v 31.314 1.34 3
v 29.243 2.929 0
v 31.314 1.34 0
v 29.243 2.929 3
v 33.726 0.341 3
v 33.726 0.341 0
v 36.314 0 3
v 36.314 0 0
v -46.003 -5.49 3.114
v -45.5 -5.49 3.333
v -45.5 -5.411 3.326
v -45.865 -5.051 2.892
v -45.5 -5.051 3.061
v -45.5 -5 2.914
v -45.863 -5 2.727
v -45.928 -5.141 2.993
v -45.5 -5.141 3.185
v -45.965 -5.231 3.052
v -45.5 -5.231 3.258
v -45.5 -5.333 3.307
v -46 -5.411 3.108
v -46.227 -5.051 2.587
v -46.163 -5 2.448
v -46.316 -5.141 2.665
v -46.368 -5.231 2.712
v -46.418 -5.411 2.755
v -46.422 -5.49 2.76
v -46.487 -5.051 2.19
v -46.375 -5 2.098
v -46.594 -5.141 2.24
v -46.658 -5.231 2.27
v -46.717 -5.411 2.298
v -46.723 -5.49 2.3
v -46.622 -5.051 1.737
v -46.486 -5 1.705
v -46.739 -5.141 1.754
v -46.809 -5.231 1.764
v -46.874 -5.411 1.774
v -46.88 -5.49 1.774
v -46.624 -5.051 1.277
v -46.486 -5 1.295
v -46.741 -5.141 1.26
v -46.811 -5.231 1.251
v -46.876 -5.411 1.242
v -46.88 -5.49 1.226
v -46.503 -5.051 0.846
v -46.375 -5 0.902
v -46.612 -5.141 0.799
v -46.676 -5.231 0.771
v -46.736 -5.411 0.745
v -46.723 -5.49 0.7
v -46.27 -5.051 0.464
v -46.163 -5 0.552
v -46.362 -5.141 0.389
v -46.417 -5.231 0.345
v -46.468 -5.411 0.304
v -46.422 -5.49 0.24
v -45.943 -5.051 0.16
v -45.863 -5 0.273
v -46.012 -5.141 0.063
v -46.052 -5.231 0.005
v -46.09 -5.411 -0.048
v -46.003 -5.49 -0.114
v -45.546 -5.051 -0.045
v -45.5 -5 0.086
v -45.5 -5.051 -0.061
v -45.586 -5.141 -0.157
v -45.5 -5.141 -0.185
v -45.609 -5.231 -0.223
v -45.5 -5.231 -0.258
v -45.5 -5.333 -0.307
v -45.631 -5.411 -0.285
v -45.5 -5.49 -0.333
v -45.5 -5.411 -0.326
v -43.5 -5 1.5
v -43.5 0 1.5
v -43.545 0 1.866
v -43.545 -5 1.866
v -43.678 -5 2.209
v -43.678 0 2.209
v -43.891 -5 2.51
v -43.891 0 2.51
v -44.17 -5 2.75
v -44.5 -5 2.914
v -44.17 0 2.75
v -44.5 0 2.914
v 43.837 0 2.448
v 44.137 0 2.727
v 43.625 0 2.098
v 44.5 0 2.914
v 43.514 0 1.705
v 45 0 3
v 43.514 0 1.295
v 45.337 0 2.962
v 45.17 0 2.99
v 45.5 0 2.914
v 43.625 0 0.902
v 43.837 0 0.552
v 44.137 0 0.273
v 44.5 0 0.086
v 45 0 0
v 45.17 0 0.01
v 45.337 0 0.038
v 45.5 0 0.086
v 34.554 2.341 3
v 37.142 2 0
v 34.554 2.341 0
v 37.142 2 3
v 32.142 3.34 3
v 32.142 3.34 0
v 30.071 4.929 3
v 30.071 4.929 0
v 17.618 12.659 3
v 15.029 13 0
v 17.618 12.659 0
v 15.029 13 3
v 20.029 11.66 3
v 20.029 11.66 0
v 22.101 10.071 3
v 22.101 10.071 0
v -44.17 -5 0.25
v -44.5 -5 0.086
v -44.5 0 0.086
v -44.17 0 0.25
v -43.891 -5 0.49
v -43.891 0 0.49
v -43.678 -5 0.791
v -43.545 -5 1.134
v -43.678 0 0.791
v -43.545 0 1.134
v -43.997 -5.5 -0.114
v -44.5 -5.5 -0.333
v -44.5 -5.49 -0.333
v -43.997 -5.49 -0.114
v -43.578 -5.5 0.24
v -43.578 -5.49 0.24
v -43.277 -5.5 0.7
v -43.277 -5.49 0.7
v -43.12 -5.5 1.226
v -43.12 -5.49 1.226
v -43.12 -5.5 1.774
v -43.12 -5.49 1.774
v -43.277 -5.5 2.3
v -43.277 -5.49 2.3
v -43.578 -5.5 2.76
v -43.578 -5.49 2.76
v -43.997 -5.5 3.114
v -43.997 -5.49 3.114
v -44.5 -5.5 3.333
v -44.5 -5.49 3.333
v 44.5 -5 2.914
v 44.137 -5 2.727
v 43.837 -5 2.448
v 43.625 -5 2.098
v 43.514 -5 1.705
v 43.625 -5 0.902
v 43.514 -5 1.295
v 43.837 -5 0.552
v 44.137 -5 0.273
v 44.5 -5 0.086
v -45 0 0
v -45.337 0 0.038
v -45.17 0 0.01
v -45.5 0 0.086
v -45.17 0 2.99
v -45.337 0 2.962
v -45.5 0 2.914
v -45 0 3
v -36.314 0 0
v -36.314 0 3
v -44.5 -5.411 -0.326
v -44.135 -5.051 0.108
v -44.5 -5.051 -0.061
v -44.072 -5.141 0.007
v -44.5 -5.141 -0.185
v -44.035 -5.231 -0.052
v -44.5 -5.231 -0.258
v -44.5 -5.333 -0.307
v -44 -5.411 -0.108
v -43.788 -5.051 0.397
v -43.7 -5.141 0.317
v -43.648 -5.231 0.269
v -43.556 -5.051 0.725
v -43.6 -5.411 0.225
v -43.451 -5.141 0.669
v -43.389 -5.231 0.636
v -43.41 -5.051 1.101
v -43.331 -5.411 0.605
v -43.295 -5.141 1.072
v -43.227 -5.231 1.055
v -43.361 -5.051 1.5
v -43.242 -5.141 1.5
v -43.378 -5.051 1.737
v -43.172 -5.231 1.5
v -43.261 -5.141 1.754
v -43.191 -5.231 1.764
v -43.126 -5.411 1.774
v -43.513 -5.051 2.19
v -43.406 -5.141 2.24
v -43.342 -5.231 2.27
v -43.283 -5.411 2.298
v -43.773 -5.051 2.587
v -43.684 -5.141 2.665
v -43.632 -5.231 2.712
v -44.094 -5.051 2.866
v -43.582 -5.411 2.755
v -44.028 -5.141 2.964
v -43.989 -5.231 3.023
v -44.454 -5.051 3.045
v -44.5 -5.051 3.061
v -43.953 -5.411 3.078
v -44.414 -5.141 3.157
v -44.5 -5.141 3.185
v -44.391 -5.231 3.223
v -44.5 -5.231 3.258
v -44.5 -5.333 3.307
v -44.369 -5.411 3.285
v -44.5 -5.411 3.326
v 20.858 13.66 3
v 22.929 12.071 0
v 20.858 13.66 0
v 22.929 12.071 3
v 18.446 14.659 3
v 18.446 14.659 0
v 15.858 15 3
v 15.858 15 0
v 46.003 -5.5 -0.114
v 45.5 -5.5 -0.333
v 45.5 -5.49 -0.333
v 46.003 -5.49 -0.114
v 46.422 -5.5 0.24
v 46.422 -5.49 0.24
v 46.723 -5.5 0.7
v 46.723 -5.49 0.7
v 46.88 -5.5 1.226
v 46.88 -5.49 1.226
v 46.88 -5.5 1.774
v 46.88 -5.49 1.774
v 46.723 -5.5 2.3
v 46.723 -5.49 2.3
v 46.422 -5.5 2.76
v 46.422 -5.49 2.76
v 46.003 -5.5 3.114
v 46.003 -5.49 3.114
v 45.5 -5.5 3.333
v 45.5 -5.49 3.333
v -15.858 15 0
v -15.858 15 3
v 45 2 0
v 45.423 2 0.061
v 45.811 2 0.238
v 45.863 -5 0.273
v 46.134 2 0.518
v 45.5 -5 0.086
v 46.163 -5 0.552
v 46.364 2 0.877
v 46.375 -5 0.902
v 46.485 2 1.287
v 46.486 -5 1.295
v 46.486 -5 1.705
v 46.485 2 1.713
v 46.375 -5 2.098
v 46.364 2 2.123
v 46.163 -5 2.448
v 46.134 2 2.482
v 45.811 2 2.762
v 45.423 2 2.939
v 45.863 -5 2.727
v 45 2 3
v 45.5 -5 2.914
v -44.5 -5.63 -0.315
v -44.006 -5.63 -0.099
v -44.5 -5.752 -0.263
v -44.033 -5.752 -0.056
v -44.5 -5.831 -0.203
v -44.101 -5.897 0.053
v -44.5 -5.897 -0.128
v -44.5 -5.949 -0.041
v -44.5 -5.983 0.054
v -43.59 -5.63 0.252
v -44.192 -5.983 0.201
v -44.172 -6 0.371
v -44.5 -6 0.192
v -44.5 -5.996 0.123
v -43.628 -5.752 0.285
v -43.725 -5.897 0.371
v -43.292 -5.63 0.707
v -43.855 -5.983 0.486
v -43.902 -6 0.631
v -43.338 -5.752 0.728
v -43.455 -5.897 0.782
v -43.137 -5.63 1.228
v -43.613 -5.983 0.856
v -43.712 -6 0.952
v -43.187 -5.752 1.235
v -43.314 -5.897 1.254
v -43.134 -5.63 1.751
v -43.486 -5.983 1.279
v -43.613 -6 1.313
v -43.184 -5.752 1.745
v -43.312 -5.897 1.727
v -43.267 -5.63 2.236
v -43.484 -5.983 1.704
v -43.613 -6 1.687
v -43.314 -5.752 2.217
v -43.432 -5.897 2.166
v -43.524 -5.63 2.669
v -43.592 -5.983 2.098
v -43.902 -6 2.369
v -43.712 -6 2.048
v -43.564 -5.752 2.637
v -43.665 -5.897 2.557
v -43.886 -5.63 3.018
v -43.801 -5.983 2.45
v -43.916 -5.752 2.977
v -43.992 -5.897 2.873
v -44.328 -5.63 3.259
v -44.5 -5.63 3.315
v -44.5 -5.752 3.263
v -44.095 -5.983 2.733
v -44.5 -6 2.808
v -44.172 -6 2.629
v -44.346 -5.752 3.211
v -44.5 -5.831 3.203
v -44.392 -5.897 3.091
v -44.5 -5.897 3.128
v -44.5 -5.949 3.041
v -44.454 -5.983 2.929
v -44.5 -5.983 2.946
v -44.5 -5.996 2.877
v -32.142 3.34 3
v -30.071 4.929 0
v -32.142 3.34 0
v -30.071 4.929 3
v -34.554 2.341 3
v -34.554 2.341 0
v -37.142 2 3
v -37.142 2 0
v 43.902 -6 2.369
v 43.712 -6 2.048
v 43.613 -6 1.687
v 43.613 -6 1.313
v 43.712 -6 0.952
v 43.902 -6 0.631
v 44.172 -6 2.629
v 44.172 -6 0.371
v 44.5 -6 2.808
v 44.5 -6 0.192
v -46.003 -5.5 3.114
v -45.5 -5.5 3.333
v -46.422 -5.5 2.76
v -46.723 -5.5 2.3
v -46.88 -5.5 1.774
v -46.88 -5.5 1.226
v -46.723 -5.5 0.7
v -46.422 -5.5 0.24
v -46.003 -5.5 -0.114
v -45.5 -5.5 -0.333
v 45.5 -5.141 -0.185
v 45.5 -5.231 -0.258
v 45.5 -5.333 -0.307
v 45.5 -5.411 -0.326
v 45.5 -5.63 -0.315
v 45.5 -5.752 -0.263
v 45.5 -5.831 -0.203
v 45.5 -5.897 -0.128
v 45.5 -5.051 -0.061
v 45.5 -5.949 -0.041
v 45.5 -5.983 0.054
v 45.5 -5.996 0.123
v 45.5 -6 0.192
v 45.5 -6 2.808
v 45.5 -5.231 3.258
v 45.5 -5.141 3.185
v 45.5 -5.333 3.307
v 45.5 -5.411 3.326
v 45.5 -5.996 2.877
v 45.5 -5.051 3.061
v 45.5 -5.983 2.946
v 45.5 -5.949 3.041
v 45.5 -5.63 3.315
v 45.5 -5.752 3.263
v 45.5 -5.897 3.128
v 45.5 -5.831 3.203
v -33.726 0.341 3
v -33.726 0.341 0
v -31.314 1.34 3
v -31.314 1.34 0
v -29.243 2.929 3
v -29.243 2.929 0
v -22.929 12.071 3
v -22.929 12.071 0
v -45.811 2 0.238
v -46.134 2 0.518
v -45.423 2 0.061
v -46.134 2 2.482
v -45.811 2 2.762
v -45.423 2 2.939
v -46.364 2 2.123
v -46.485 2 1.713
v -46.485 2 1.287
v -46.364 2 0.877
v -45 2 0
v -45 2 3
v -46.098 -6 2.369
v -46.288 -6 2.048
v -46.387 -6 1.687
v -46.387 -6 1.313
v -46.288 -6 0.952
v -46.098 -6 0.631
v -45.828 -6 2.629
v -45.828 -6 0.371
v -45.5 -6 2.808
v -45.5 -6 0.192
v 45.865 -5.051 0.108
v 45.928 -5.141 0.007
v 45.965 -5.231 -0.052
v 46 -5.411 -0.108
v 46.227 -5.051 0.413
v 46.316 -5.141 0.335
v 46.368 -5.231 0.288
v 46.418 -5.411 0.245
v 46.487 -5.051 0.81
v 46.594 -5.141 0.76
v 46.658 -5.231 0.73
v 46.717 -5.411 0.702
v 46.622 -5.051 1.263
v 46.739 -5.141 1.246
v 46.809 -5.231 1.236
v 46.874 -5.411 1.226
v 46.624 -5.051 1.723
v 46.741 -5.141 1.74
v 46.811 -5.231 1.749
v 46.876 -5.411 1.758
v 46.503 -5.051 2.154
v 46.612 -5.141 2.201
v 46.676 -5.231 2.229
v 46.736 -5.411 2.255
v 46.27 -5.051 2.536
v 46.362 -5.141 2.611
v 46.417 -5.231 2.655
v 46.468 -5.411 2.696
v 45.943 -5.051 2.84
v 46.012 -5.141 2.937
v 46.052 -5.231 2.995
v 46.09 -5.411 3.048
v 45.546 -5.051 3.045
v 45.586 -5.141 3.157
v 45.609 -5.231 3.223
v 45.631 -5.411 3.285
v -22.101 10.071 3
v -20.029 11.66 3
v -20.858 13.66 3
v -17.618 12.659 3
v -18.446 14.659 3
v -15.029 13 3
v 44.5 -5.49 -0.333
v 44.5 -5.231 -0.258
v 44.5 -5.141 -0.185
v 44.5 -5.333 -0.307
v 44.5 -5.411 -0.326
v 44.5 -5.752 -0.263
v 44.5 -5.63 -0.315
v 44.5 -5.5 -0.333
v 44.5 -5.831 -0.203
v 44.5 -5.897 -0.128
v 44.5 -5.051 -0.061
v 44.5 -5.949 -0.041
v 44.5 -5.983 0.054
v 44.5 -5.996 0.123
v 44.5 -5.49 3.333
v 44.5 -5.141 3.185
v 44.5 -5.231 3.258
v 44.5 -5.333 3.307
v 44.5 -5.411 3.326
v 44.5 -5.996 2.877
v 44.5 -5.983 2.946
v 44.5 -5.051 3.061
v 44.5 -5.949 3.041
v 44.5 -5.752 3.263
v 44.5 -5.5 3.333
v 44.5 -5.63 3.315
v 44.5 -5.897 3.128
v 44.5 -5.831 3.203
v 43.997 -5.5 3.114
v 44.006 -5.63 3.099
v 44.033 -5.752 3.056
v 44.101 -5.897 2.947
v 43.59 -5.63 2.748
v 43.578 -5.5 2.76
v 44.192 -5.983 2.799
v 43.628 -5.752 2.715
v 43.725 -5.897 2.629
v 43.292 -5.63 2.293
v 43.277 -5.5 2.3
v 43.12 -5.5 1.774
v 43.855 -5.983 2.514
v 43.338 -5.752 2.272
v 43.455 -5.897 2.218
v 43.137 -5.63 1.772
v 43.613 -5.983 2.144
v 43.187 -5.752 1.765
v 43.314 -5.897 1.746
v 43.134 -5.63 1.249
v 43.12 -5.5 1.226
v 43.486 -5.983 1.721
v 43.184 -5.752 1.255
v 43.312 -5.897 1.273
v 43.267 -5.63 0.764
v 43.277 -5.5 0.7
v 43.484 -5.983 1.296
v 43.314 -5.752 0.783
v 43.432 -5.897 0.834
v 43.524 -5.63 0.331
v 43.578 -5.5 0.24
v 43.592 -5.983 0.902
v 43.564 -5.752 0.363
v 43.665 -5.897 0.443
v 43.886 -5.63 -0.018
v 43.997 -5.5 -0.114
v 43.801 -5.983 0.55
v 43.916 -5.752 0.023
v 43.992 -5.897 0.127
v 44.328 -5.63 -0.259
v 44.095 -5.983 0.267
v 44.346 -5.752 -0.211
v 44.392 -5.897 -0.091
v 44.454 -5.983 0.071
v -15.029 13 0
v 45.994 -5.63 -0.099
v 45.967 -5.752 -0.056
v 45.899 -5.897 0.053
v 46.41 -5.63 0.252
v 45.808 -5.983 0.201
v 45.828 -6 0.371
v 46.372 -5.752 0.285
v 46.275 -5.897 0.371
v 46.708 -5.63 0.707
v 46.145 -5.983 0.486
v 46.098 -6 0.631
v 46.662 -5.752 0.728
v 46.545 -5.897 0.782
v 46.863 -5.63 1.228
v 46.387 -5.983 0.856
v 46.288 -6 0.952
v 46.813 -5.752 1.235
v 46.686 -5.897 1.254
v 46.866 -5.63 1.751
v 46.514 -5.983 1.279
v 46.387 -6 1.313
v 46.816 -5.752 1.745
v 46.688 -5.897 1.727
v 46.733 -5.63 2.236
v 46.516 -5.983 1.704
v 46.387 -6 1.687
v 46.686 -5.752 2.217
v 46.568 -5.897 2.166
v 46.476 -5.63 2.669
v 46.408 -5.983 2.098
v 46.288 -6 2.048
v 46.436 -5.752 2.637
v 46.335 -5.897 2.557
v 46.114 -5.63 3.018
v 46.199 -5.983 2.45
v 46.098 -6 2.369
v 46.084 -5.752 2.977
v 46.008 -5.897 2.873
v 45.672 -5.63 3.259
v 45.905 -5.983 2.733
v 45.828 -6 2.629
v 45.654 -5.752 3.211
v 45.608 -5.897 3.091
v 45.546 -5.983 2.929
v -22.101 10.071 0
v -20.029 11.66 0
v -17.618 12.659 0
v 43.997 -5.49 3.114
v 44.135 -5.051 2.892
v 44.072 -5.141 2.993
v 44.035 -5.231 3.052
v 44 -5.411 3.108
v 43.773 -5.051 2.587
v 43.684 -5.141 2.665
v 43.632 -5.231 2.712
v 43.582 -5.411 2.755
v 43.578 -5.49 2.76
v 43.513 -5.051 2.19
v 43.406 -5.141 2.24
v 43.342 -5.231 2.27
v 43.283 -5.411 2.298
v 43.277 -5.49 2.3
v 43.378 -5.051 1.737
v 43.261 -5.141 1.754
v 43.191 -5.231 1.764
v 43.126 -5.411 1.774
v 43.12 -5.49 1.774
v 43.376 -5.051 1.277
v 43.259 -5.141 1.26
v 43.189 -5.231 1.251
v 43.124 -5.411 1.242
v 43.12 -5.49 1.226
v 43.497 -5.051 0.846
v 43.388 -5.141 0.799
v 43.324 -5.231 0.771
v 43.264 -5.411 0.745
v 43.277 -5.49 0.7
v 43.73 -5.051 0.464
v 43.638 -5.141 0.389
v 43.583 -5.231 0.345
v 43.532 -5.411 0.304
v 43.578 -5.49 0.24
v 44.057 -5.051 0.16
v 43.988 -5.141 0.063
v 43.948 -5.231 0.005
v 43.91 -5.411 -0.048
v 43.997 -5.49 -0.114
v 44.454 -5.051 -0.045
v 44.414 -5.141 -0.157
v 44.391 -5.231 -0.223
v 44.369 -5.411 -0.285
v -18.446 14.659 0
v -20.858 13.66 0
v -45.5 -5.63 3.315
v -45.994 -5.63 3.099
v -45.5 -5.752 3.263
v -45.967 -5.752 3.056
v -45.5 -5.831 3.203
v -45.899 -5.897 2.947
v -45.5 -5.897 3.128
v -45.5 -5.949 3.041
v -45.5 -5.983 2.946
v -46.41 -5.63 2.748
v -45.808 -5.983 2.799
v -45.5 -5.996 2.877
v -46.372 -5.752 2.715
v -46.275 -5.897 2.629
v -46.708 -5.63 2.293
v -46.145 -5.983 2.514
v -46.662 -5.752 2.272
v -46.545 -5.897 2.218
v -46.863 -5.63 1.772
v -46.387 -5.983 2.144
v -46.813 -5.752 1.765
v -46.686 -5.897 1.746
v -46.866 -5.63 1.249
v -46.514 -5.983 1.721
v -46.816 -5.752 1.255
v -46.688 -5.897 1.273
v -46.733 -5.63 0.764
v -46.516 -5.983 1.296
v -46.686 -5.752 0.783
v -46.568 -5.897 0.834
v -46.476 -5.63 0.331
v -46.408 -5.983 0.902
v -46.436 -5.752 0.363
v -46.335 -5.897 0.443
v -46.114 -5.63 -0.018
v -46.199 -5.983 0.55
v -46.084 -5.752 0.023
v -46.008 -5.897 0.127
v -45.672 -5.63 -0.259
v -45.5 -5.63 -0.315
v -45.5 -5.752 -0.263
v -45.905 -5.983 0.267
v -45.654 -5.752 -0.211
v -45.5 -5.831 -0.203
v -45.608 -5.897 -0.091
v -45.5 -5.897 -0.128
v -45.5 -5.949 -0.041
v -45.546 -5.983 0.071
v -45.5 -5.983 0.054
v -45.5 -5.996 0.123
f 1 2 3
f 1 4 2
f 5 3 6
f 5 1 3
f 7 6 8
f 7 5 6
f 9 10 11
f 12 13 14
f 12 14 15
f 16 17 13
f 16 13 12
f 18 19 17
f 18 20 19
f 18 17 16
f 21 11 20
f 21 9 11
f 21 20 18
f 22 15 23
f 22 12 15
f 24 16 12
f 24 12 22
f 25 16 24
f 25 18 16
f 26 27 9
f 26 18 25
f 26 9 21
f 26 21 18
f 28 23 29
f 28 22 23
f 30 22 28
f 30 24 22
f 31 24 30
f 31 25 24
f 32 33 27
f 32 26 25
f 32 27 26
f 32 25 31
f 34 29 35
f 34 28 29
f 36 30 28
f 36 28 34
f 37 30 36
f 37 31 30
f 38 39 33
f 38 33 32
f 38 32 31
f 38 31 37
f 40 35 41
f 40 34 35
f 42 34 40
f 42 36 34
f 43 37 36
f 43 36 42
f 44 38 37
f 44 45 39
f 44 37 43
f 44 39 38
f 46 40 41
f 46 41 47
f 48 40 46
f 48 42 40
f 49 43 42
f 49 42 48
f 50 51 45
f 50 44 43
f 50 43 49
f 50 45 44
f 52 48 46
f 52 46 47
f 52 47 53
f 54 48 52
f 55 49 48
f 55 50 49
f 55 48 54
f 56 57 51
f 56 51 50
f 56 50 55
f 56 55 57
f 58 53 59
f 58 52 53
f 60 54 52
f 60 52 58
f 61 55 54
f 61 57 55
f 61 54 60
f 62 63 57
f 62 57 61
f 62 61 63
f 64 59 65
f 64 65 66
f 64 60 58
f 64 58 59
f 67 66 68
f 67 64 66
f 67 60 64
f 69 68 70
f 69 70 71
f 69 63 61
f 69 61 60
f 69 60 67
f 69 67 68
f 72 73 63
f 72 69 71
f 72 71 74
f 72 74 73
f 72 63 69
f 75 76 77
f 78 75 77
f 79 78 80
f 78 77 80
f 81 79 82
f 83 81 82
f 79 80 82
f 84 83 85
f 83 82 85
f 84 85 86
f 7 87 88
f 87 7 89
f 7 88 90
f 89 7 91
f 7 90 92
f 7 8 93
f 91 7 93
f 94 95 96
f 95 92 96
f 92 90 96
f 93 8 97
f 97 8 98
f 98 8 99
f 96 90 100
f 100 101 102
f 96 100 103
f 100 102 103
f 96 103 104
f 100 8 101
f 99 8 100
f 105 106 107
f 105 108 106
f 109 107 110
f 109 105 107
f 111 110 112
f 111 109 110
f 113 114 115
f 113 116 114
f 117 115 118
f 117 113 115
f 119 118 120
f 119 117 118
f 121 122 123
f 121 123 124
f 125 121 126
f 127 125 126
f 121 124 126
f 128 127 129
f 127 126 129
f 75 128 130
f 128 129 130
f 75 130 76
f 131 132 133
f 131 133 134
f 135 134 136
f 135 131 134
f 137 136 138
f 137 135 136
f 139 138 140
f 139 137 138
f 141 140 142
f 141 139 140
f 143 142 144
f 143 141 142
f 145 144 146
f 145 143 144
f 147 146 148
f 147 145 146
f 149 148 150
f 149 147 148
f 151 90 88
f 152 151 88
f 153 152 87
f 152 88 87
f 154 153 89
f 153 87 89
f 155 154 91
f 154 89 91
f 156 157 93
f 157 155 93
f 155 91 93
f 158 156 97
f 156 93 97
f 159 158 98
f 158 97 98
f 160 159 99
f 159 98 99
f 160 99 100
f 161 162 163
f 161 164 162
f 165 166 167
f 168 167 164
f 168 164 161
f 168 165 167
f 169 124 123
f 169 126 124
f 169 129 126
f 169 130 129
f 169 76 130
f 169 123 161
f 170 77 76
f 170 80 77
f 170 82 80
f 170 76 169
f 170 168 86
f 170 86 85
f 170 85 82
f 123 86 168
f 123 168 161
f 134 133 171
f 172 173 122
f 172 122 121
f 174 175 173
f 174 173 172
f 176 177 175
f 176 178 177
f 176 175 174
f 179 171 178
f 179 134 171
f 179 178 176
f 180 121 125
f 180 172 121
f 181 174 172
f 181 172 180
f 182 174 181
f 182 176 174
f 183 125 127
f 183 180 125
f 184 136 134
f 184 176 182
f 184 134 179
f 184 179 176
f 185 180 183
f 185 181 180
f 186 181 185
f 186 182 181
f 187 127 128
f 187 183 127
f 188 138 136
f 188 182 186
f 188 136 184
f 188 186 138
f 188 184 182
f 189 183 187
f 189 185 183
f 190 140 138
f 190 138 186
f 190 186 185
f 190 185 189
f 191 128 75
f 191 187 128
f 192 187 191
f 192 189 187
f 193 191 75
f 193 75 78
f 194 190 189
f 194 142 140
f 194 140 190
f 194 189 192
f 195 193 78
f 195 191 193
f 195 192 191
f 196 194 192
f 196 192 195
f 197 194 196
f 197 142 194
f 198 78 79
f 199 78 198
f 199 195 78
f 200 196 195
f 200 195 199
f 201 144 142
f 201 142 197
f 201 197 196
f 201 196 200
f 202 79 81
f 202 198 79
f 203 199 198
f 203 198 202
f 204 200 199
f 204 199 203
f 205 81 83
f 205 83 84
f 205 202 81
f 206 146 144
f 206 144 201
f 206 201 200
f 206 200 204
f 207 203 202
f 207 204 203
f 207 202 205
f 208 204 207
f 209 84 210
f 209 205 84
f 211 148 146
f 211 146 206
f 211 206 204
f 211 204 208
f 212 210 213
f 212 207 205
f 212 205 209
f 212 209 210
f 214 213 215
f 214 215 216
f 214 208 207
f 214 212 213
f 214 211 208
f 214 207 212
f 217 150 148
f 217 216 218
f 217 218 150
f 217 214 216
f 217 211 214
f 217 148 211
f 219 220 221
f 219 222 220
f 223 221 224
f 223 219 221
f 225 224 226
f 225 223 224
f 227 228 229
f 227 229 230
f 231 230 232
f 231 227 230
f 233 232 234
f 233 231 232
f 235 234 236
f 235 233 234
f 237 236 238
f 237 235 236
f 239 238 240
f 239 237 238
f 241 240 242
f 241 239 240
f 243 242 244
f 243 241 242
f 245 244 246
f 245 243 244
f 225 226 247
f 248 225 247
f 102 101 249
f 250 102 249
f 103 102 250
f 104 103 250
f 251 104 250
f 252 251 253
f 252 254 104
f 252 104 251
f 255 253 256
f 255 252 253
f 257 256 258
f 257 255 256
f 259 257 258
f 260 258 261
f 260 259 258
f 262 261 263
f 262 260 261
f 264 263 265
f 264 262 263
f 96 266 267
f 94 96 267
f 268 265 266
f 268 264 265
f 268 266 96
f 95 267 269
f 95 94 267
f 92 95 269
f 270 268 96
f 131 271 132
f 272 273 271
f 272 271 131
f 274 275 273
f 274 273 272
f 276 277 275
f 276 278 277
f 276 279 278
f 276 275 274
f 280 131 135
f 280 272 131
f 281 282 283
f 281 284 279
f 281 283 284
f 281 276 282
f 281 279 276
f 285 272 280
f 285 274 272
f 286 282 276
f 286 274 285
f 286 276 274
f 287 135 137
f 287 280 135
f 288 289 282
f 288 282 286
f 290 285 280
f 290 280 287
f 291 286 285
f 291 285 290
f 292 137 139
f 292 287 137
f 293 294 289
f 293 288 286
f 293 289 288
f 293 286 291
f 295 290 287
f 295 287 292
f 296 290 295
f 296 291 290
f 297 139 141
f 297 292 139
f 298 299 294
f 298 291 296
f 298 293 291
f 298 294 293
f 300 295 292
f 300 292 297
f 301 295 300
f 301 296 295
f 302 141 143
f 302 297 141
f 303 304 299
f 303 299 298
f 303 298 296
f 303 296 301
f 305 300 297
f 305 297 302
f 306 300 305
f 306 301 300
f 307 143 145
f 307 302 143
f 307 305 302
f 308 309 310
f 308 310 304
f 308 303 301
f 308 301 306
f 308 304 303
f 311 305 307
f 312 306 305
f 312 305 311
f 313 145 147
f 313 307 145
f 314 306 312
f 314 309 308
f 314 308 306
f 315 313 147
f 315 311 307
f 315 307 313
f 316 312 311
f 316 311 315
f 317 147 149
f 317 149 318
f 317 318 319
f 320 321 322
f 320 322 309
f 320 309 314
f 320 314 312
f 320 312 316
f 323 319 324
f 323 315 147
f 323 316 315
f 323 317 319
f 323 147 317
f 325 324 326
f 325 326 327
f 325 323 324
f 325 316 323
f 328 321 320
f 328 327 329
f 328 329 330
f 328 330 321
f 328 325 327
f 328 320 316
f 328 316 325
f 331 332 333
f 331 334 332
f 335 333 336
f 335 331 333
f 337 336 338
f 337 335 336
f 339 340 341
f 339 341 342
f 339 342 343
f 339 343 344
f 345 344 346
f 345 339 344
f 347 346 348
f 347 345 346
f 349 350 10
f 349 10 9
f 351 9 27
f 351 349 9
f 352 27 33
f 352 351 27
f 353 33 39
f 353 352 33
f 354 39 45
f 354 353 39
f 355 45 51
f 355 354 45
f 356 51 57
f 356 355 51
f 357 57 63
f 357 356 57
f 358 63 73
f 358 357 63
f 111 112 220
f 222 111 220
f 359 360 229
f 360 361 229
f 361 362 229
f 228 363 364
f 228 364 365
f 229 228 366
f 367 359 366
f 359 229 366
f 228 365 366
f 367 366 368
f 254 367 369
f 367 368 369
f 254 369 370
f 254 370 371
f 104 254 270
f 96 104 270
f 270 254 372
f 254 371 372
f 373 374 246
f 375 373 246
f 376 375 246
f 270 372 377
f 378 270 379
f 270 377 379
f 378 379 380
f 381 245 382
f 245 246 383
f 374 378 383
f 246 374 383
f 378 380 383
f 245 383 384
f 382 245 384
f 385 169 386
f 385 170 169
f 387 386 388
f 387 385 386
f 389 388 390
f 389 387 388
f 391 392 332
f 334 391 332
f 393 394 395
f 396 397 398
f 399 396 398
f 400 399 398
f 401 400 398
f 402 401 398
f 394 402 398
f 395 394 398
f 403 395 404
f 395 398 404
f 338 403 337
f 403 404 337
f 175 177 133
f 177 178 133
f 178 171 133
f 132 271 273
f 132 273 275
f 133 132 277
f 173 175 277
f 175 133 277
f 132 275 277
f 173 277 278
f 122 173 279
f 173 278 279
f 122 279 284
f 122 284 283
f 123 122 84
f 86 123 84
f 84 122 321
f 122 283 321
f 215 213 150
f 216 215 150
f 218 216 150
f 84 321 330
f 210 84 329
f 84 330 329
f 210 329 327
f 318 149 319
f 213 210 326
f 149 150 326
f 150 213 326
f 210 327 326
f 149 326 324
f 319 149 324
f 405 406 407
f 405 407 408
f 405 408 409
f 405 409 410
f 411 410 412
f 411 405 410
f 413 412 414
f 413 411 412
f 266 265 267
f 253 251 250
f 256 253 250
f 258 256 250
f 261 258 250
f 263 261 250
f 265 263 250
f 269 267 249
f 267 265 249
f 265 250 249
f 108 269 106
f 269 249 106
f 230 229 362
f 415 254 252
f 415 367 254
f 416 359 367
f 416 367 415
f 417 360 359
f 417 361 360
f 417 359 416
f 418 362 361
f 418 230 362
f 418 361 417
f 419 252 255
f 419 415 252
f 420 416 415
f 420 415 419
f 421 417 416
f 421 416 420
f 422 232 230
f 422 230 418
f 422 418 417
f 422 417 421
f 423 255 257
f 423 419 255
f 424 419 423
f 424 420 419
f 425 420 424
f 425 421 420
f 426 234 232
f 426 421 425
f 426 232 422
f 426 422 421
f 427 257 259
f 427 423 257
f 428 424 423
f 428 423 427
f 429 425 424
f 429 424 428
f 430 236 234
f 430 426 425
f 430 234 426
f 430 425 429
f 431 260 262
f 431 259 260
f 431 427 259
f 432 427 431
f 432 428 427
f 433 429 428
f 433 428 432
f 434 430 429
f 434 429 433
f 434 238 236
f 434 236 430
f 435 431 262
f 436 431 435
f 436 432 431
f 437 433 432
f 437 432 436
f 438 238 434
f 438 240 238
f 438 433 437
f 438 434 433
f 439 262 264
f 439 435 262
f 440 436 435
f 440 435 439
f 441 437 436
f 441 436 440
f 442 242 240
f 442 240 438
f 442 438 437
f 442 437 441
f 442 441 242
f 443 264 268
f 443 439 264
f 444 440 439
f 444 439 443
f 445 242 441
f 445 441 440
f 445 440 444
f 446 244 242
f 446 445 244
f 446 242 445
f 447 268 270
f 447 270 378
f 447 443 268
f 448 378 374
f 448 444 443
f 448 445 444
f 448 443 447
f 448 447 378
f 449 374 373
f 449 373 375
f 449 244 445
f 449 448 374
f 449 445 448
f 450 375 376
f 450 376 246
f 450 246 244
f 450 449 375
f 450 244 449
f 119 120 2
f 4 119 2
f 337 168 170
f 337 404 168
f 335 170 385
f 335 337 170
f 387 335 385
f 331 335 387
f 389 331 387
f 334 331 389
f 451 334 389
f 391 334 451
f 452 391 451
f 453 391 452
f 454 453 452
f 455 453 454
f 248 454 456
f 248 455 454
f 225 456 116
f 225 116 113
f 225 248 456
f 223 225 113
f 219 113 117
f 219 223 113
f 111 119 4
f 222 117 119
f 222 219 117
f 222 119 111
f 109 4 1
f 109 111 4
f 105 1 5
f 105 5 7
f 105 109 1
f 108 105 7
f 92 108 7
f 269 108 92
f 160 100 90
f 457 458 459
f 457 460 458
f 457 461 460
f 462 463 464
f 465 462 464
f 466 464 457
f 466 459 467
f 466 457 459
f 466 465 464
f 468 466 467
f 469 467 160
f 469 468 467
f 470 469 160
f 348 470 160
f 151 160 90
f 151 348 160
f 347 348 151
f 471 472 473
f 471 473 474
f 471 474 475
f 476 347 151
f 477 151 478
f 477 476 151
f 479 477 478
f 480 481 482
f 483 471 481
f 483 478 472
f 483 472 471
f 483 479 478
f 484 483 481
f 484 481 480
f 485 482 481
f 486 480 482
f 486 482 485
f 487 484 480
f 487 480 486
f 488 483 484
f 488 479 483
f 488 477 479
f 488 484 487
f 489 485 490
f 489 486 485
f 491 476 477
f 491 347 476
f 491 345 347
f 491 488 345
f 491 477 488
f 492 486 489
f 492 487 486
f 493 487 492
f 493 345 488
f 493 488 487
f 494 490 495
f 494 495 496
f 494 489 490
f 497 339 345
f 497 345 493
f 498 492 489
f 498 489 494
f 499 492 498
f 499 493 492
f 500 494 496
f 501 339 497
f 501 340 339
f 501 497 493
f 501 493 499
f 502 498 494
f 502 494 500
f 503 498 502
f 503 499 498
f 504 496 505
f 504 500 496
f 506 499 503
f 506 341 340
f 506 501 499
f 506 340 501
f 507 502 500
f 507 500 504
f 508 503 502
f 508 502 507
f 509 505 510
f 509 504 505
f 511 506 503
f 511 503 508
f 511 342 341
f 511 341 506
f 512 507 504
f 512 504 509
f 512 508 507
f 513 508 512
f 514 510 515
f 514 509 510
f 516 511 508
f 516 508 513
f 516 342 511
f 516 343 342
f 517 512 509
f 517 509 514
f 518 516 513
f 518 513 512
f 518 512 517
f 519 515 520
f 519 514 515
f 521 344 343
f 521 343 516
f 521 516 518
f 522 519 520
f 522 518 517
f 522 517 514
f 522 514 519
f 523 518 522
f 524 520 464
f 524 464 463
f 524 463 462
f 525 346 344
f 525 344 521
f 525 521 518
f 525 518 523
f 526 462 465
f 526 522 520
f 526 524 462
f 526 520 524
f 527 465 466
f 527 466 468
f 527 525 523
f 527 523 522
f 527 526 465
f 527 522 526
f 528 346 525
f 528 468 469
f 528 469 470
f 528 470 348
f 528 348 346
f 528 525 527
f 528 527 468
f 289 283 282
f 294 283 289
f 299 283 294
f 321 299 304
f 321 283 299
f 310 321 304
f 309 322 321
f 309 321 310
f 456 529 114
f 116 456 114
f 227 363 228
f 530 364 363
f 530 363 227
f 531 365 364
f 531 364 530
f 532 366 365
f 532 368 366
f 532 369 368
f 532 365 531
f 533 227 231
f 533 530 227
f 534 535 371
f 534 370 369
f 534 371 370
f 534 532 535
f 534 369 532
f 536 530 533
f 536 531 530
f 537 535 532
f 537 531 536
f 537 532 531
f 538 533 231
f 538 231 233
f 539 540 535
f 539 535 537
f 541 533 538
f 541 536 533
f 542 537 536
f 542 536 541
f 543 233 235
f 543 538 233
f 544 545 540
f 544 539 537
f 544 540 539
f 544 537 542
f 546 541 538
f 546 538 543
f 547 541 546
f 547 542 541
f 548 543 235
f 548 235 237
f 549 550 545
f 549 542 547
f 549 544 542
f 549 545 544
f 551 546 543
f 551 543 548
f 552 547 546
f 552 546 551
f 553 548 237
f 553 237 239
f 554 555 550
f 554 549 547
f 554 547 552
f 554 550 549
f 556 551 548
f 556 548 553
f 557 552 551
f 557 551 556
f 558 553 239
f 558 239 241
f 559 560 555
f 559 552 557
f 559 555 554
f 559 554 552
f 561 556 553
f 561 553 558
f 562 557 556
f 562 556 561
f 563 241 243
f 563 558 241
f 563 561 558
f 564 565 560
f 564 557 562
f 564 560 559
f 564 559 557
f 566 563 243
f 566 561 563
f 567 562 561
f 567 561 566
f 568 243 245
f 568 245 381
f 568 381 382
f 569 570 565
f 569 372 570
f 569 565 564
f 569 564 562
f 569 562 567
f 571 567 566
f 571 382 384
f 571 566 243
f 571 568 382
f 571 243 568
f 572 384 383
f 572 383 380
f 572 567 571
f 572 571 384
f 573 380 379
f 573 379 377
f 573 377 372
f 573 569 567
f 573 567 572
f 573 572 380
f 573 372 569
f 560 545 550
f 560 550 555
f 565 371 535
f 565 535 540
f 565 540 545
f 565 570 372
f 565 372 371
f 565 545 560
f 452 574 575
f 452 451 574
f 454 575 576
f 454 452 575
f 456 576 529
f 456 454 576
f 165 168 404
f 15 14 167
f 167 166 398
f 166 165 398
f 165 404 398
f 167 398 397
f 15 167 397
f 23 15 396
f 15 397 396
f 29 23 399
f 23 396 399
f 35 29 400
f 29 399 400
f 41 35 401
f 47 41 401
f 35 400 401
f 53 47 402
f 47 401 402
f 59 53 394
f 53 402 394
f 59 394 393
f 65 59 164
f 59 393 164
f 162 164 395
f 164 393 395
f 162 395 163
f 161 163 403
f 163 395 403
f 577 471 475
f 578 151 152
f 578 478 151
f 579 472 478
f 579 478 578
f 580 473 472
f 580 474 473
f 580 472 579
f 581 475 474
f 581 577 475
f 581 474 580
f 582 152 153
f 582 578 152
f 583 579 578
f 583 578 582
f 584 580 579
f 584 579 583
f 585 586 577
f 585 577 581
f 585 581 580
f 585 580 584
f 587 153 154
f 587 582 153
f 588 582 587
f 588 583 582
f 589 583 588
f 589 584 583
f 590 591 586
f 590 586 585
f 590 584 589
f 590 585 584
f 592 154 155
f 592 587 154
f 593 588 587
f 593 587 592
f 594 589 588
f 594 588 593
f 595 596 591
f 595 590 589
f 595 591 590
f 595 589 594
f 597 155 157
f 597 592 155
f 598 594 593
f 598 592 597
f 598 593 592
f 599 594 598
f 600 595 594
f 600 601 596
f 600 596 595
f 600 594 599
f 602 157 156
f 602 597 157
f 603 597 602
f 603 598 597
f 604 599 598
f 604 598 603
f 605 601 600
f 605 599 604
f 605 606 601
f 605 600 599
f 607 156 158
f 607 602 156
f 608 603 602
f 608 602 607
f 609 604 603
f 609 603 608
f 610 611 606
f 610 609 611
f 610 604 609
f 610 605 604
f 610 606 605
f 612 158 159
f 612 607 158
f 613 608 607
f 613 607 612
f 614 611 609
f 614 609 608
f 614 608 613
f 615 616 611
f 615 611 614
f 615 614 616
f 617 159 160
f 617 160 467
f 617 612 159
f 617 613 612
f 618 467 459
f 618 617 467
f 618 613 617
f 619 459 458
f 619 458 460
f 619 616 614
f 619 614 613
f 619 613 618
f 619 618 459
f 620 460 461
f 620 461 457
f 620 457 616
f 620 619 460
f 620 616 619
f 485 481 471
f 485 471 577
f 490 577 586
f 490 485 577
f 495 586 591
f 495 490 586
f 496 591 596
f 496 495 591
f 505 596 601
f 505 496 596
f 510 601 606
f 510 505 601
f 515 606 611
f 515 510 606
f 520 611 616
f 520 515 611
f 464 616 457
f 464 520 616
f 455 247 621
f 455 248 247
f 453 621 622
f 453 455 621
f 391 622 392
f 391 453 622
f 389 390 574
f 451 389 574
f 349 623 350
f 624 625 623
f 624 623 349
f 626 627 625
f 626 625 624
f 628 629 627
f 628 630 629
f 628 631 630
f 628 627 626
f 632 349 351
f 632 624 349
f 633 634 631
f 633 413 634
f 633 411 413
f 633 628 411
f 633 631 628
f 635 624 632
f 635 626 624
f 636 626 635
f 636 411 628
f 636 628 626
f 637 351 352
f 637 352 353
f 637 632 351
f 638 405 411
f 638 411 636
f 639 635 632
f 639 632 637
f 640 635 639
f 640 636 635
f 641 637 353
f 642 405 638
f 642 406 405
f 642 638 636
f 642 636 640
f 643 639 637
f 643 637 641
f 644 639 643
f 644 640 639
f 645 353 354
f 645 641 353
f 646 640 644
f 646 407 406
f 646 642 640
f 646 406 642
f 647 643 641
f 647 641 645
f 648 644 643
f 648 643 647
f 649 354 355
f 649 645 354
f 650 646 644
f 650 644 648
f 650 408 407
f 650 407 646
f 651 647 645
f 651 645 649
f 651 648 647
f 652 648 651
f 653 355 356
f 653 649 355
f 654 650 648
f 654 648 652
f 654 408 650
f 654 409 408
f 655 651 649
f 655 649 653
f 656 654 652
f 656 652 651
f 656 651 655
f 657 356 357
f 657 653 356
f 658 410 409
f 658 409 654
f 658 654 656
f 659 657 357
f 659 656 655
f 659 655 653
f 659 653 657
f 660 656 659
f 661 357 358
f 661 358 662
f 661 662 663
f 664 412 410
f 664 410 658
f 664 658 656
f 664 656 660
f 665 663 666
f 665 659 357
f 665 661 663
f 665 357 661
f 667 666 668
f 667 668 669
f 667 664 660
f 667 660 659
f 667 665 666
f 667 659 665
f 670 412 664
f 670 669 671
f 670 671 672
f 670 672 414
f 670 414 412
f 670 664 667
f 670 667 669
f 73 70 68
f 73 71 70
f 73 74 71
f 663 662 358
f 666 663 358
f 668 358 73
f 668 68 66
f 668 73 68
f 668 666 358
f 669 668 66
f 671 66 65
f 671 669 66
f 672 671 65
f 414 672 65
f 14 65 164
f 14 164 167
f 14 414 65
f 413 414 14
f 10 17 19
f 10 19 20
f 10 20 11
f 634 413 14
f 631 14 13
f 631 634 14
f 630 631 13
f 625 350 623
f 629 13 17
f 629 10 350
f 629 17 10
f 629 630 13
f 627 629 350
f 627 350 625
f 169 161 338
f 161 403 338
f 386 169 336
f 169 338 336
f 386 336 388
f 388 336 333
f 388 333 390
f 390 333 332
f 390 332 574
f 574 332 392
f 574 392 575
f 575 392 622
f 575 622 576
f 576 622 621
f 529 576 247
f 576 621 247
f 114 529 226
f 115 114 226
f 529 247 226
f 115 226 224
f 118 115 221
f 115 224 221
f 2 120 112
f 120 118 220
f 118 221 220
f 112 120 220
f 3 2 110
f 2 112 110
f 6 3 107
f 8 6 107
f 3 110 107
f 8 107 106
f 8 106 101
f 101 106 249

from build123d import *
from build123d import SkipClean  # not in build123d's __all__

# Parameters (mm, degrees)
F1_DEPTH  = 3
F2_R      = 10
F3_R      = 1.5
F4_DEPTH  = 2
F5_DEPTH  = 6
F6_R      = 1.9
F6_R_2    = 1.5
F7_DEPTH  = 1
F9_W      = 1
F9_H      = 10.6840910192
F9_W_2    = 7.2588436306
F9_H_2    = 0.5
F9_W_3    = 6.9682821631
F10_DEPTH = 6


# Not quite as in the source:
# - a fillet or chamfer that OpenCascade refuses, or shapes differently, is made with other operations: its cross-section is extruded or revolved along the edge and cut away or added
# - after a boolean that leaves OpenCascade's solid faulty, fix() repairs it


with BuildPart() as f1:
    # F0 (on Top) → F1 (new body)
    with BuildSketch(Plane.XY):
        Polygon((-45, 2), (-45, 0), (-32.1715728753, 0), (-33, 2), align=None)
        Polygon((-33, 2), (-32.1715728753, 0), (-19.1715728753, 13), (-20, 15), align=None)
        Polygon((-20, 15), (-19.1715728753, 13), (0, 13), (0, 15), align=None)
        Polygon((0, 15), (0, 13), (19.1715728753, 13), (20, 15), align=None)
        Polygon((20, 15), (19.1715728753, 13), (32.1715728753, 0), (33, 2), align=None)
        Polygon((33, 2), (32.1715728753, 0), (45, 0), (45, 2), align=None)
    extrude(amount=F1_DEPTH)

    # F2
    f2_edges = [f1.edges().sort_by_distance(p)[0] for p in [
        (-33, 2, 1.5),
        (-20, 15, 1.5),
        (20, 15, 1.5),
        (33, 2, 1.5),
        (32.171573, 0, 1.5),
        (19.171573, 13, 1.5),
        (-19.171573, 13, 1.5),
        (-32.171573, 0, 1.5),
    ]]
    fillet(f2_edges, radius=F2_R)

    # F3 (on face) → F4 (join, through all)
    with BuildSketch(Plane.XZ):
        with BuildLine():
            Line((-45, 0), (-45, 3))
            ThreePointArc((-45, 3), (-46.5, 1.5), (-45, 0))
        make_face()
        with Locations((45, 1.5)):
            Circle(F3_R)
    extrude(amount=-F4_DEPTH)

    # F3 (on face) → F5 (join)
    with BuildSketch(Plane.XZ):
        with BuildLine():
            Line((-45, 0), (-45, 3))
            ThreePointArc((-45, 3), (-46.5, 1.5), (-45, 0))
        make_face()
        with BuildLine():
            ThreePointArc((-45, 0), (-43.9393398282, 0.4393398282), (-43.5, 1.5))
            ThreePointArc((-43.5, 1.5), (-43.9393398282, 2.5606601718), (-45, 3))
            Line((-45, 3), (-45, 0))
        make_face()
        with Locations((45, 1.5)):
            Circle(F3_R)
    with SkipClean():  # cleaning this boolean's faces spoils the solid; the shape is the same uncleaned
        extrude(amount=F5_DEPTH)

    # F6 (on face) → F7 (join)
    with BuildSketch(Plane.XZ.offset(6)):
        with Locations((-45, 1.5)):
            Circle(F6_R)
        with Locations((-45, 1.5)):
            Circle(F6_R_2, mode=Mode.SUBTRACT)
        with Locations((45, 1.5)):
            Circle(F6_R)
    extrude(amount=-F7_DEPTH)

    add(f1.part.fix(), mode=Mode.REPLACE)

    # F8: fillet of radius 0.5 on 4 edges, made by hand

    # F8_s1 → F8_t2 (revolve, cut)
    with BuildSketch(Plane.XY.offset(1.5)):
        with BuildLine():
            ThreePointArc((-43.1, -5.5), (-43.2464466094, -5.8535533906), (-43.6, -6))
            Line((-43.6, -6), (-43.1, -6))
            Line((-43.1, -6), (-43.1, -5.5))
        make_face()
    revolve(axis=Axis((-45, -6, 1.5), (0, -1, 0)), mode=Mode.SUBTRACT)

    # F8_s3 → F8_t4 (revolve, cut)
    with BuildSketch(Plane.XY.offset(1.5)):
        with BuildLine():
            ThreePointArc((-43.5, -5), (-43.2127016654, -5.1736701825), (-43.1, -5.4898979486))
            Line((-43.1, -5.4898979486), (-43.1, -5))
            Line((-43.1, -5), (-43.5, -5))
        make_face()
    revolve(axis=Axis((-45, -5, 1.5), (0, -1, 0)), mode=Mode.SUBTRACT)

    # F8_s5 → F8_t6 (revolve, cut)
    with BuildSketch(Plane.XY.offset(1.5)):
        with BuildLine():
            ThreePointArc((46.5, -5), (46.7872983346, -5.1736701825), (46.9, -5.4898979486))
            Line((46.9, -5.4898979486), (46.9, -5))
            Line((46.9, -5), (46.5, -5))
        make_face()
    revolve(axis=Axis((45, -5, 1.5), (0, -1, 0)), mode=Mode.SUBTRACT)

    # F8_s7 → F8_t8 (revolve, cut)
    with BuildSketch(Plane.XY.offset(1.5)):
        with BuildLine():
            ThreePointArc((46.9, -5.5), (46.7535533906, -5.8535533906), (46.4, -6))
            Line((46.4, -6), (46.9, -6))
            Line((46.9, -6), (46.9, -5.5))
        make_face()
    revolve(axis=Axis((45, -6, 1.5), (0, -1, 0)), mode=Mode.SUBTRACT)

    # F9 (on face) → F10 (cut, through all)
    with BuildSketch(Plane.XZ.offset(6)):
        with Locations((-45, 1.5)):
            Rectangle(F9_W, F9_H)
        with Locations((-54.3349329382, 3.15)):
            Rectangle(F9_W_2, F9_H_2)
        with Locations((-54.1896522045, -0.15)):
            Rectangle(F9_W_3, F9_H_2)
        with Locations((54.1896522045, -0.15)):
            Rectangle(F9_W_3, F9_H_2)
        with Locations((54.3349329382, 3.15)):
            Rectangle(F9_W_2, F9_H_2)
        with Locations((45, 1.5)):
            Rectangle(F9_W, F9_H)
    extrude(amount=-F10_DEPTH, mode=Mode.SUBTRACT)


solid = f1.part
